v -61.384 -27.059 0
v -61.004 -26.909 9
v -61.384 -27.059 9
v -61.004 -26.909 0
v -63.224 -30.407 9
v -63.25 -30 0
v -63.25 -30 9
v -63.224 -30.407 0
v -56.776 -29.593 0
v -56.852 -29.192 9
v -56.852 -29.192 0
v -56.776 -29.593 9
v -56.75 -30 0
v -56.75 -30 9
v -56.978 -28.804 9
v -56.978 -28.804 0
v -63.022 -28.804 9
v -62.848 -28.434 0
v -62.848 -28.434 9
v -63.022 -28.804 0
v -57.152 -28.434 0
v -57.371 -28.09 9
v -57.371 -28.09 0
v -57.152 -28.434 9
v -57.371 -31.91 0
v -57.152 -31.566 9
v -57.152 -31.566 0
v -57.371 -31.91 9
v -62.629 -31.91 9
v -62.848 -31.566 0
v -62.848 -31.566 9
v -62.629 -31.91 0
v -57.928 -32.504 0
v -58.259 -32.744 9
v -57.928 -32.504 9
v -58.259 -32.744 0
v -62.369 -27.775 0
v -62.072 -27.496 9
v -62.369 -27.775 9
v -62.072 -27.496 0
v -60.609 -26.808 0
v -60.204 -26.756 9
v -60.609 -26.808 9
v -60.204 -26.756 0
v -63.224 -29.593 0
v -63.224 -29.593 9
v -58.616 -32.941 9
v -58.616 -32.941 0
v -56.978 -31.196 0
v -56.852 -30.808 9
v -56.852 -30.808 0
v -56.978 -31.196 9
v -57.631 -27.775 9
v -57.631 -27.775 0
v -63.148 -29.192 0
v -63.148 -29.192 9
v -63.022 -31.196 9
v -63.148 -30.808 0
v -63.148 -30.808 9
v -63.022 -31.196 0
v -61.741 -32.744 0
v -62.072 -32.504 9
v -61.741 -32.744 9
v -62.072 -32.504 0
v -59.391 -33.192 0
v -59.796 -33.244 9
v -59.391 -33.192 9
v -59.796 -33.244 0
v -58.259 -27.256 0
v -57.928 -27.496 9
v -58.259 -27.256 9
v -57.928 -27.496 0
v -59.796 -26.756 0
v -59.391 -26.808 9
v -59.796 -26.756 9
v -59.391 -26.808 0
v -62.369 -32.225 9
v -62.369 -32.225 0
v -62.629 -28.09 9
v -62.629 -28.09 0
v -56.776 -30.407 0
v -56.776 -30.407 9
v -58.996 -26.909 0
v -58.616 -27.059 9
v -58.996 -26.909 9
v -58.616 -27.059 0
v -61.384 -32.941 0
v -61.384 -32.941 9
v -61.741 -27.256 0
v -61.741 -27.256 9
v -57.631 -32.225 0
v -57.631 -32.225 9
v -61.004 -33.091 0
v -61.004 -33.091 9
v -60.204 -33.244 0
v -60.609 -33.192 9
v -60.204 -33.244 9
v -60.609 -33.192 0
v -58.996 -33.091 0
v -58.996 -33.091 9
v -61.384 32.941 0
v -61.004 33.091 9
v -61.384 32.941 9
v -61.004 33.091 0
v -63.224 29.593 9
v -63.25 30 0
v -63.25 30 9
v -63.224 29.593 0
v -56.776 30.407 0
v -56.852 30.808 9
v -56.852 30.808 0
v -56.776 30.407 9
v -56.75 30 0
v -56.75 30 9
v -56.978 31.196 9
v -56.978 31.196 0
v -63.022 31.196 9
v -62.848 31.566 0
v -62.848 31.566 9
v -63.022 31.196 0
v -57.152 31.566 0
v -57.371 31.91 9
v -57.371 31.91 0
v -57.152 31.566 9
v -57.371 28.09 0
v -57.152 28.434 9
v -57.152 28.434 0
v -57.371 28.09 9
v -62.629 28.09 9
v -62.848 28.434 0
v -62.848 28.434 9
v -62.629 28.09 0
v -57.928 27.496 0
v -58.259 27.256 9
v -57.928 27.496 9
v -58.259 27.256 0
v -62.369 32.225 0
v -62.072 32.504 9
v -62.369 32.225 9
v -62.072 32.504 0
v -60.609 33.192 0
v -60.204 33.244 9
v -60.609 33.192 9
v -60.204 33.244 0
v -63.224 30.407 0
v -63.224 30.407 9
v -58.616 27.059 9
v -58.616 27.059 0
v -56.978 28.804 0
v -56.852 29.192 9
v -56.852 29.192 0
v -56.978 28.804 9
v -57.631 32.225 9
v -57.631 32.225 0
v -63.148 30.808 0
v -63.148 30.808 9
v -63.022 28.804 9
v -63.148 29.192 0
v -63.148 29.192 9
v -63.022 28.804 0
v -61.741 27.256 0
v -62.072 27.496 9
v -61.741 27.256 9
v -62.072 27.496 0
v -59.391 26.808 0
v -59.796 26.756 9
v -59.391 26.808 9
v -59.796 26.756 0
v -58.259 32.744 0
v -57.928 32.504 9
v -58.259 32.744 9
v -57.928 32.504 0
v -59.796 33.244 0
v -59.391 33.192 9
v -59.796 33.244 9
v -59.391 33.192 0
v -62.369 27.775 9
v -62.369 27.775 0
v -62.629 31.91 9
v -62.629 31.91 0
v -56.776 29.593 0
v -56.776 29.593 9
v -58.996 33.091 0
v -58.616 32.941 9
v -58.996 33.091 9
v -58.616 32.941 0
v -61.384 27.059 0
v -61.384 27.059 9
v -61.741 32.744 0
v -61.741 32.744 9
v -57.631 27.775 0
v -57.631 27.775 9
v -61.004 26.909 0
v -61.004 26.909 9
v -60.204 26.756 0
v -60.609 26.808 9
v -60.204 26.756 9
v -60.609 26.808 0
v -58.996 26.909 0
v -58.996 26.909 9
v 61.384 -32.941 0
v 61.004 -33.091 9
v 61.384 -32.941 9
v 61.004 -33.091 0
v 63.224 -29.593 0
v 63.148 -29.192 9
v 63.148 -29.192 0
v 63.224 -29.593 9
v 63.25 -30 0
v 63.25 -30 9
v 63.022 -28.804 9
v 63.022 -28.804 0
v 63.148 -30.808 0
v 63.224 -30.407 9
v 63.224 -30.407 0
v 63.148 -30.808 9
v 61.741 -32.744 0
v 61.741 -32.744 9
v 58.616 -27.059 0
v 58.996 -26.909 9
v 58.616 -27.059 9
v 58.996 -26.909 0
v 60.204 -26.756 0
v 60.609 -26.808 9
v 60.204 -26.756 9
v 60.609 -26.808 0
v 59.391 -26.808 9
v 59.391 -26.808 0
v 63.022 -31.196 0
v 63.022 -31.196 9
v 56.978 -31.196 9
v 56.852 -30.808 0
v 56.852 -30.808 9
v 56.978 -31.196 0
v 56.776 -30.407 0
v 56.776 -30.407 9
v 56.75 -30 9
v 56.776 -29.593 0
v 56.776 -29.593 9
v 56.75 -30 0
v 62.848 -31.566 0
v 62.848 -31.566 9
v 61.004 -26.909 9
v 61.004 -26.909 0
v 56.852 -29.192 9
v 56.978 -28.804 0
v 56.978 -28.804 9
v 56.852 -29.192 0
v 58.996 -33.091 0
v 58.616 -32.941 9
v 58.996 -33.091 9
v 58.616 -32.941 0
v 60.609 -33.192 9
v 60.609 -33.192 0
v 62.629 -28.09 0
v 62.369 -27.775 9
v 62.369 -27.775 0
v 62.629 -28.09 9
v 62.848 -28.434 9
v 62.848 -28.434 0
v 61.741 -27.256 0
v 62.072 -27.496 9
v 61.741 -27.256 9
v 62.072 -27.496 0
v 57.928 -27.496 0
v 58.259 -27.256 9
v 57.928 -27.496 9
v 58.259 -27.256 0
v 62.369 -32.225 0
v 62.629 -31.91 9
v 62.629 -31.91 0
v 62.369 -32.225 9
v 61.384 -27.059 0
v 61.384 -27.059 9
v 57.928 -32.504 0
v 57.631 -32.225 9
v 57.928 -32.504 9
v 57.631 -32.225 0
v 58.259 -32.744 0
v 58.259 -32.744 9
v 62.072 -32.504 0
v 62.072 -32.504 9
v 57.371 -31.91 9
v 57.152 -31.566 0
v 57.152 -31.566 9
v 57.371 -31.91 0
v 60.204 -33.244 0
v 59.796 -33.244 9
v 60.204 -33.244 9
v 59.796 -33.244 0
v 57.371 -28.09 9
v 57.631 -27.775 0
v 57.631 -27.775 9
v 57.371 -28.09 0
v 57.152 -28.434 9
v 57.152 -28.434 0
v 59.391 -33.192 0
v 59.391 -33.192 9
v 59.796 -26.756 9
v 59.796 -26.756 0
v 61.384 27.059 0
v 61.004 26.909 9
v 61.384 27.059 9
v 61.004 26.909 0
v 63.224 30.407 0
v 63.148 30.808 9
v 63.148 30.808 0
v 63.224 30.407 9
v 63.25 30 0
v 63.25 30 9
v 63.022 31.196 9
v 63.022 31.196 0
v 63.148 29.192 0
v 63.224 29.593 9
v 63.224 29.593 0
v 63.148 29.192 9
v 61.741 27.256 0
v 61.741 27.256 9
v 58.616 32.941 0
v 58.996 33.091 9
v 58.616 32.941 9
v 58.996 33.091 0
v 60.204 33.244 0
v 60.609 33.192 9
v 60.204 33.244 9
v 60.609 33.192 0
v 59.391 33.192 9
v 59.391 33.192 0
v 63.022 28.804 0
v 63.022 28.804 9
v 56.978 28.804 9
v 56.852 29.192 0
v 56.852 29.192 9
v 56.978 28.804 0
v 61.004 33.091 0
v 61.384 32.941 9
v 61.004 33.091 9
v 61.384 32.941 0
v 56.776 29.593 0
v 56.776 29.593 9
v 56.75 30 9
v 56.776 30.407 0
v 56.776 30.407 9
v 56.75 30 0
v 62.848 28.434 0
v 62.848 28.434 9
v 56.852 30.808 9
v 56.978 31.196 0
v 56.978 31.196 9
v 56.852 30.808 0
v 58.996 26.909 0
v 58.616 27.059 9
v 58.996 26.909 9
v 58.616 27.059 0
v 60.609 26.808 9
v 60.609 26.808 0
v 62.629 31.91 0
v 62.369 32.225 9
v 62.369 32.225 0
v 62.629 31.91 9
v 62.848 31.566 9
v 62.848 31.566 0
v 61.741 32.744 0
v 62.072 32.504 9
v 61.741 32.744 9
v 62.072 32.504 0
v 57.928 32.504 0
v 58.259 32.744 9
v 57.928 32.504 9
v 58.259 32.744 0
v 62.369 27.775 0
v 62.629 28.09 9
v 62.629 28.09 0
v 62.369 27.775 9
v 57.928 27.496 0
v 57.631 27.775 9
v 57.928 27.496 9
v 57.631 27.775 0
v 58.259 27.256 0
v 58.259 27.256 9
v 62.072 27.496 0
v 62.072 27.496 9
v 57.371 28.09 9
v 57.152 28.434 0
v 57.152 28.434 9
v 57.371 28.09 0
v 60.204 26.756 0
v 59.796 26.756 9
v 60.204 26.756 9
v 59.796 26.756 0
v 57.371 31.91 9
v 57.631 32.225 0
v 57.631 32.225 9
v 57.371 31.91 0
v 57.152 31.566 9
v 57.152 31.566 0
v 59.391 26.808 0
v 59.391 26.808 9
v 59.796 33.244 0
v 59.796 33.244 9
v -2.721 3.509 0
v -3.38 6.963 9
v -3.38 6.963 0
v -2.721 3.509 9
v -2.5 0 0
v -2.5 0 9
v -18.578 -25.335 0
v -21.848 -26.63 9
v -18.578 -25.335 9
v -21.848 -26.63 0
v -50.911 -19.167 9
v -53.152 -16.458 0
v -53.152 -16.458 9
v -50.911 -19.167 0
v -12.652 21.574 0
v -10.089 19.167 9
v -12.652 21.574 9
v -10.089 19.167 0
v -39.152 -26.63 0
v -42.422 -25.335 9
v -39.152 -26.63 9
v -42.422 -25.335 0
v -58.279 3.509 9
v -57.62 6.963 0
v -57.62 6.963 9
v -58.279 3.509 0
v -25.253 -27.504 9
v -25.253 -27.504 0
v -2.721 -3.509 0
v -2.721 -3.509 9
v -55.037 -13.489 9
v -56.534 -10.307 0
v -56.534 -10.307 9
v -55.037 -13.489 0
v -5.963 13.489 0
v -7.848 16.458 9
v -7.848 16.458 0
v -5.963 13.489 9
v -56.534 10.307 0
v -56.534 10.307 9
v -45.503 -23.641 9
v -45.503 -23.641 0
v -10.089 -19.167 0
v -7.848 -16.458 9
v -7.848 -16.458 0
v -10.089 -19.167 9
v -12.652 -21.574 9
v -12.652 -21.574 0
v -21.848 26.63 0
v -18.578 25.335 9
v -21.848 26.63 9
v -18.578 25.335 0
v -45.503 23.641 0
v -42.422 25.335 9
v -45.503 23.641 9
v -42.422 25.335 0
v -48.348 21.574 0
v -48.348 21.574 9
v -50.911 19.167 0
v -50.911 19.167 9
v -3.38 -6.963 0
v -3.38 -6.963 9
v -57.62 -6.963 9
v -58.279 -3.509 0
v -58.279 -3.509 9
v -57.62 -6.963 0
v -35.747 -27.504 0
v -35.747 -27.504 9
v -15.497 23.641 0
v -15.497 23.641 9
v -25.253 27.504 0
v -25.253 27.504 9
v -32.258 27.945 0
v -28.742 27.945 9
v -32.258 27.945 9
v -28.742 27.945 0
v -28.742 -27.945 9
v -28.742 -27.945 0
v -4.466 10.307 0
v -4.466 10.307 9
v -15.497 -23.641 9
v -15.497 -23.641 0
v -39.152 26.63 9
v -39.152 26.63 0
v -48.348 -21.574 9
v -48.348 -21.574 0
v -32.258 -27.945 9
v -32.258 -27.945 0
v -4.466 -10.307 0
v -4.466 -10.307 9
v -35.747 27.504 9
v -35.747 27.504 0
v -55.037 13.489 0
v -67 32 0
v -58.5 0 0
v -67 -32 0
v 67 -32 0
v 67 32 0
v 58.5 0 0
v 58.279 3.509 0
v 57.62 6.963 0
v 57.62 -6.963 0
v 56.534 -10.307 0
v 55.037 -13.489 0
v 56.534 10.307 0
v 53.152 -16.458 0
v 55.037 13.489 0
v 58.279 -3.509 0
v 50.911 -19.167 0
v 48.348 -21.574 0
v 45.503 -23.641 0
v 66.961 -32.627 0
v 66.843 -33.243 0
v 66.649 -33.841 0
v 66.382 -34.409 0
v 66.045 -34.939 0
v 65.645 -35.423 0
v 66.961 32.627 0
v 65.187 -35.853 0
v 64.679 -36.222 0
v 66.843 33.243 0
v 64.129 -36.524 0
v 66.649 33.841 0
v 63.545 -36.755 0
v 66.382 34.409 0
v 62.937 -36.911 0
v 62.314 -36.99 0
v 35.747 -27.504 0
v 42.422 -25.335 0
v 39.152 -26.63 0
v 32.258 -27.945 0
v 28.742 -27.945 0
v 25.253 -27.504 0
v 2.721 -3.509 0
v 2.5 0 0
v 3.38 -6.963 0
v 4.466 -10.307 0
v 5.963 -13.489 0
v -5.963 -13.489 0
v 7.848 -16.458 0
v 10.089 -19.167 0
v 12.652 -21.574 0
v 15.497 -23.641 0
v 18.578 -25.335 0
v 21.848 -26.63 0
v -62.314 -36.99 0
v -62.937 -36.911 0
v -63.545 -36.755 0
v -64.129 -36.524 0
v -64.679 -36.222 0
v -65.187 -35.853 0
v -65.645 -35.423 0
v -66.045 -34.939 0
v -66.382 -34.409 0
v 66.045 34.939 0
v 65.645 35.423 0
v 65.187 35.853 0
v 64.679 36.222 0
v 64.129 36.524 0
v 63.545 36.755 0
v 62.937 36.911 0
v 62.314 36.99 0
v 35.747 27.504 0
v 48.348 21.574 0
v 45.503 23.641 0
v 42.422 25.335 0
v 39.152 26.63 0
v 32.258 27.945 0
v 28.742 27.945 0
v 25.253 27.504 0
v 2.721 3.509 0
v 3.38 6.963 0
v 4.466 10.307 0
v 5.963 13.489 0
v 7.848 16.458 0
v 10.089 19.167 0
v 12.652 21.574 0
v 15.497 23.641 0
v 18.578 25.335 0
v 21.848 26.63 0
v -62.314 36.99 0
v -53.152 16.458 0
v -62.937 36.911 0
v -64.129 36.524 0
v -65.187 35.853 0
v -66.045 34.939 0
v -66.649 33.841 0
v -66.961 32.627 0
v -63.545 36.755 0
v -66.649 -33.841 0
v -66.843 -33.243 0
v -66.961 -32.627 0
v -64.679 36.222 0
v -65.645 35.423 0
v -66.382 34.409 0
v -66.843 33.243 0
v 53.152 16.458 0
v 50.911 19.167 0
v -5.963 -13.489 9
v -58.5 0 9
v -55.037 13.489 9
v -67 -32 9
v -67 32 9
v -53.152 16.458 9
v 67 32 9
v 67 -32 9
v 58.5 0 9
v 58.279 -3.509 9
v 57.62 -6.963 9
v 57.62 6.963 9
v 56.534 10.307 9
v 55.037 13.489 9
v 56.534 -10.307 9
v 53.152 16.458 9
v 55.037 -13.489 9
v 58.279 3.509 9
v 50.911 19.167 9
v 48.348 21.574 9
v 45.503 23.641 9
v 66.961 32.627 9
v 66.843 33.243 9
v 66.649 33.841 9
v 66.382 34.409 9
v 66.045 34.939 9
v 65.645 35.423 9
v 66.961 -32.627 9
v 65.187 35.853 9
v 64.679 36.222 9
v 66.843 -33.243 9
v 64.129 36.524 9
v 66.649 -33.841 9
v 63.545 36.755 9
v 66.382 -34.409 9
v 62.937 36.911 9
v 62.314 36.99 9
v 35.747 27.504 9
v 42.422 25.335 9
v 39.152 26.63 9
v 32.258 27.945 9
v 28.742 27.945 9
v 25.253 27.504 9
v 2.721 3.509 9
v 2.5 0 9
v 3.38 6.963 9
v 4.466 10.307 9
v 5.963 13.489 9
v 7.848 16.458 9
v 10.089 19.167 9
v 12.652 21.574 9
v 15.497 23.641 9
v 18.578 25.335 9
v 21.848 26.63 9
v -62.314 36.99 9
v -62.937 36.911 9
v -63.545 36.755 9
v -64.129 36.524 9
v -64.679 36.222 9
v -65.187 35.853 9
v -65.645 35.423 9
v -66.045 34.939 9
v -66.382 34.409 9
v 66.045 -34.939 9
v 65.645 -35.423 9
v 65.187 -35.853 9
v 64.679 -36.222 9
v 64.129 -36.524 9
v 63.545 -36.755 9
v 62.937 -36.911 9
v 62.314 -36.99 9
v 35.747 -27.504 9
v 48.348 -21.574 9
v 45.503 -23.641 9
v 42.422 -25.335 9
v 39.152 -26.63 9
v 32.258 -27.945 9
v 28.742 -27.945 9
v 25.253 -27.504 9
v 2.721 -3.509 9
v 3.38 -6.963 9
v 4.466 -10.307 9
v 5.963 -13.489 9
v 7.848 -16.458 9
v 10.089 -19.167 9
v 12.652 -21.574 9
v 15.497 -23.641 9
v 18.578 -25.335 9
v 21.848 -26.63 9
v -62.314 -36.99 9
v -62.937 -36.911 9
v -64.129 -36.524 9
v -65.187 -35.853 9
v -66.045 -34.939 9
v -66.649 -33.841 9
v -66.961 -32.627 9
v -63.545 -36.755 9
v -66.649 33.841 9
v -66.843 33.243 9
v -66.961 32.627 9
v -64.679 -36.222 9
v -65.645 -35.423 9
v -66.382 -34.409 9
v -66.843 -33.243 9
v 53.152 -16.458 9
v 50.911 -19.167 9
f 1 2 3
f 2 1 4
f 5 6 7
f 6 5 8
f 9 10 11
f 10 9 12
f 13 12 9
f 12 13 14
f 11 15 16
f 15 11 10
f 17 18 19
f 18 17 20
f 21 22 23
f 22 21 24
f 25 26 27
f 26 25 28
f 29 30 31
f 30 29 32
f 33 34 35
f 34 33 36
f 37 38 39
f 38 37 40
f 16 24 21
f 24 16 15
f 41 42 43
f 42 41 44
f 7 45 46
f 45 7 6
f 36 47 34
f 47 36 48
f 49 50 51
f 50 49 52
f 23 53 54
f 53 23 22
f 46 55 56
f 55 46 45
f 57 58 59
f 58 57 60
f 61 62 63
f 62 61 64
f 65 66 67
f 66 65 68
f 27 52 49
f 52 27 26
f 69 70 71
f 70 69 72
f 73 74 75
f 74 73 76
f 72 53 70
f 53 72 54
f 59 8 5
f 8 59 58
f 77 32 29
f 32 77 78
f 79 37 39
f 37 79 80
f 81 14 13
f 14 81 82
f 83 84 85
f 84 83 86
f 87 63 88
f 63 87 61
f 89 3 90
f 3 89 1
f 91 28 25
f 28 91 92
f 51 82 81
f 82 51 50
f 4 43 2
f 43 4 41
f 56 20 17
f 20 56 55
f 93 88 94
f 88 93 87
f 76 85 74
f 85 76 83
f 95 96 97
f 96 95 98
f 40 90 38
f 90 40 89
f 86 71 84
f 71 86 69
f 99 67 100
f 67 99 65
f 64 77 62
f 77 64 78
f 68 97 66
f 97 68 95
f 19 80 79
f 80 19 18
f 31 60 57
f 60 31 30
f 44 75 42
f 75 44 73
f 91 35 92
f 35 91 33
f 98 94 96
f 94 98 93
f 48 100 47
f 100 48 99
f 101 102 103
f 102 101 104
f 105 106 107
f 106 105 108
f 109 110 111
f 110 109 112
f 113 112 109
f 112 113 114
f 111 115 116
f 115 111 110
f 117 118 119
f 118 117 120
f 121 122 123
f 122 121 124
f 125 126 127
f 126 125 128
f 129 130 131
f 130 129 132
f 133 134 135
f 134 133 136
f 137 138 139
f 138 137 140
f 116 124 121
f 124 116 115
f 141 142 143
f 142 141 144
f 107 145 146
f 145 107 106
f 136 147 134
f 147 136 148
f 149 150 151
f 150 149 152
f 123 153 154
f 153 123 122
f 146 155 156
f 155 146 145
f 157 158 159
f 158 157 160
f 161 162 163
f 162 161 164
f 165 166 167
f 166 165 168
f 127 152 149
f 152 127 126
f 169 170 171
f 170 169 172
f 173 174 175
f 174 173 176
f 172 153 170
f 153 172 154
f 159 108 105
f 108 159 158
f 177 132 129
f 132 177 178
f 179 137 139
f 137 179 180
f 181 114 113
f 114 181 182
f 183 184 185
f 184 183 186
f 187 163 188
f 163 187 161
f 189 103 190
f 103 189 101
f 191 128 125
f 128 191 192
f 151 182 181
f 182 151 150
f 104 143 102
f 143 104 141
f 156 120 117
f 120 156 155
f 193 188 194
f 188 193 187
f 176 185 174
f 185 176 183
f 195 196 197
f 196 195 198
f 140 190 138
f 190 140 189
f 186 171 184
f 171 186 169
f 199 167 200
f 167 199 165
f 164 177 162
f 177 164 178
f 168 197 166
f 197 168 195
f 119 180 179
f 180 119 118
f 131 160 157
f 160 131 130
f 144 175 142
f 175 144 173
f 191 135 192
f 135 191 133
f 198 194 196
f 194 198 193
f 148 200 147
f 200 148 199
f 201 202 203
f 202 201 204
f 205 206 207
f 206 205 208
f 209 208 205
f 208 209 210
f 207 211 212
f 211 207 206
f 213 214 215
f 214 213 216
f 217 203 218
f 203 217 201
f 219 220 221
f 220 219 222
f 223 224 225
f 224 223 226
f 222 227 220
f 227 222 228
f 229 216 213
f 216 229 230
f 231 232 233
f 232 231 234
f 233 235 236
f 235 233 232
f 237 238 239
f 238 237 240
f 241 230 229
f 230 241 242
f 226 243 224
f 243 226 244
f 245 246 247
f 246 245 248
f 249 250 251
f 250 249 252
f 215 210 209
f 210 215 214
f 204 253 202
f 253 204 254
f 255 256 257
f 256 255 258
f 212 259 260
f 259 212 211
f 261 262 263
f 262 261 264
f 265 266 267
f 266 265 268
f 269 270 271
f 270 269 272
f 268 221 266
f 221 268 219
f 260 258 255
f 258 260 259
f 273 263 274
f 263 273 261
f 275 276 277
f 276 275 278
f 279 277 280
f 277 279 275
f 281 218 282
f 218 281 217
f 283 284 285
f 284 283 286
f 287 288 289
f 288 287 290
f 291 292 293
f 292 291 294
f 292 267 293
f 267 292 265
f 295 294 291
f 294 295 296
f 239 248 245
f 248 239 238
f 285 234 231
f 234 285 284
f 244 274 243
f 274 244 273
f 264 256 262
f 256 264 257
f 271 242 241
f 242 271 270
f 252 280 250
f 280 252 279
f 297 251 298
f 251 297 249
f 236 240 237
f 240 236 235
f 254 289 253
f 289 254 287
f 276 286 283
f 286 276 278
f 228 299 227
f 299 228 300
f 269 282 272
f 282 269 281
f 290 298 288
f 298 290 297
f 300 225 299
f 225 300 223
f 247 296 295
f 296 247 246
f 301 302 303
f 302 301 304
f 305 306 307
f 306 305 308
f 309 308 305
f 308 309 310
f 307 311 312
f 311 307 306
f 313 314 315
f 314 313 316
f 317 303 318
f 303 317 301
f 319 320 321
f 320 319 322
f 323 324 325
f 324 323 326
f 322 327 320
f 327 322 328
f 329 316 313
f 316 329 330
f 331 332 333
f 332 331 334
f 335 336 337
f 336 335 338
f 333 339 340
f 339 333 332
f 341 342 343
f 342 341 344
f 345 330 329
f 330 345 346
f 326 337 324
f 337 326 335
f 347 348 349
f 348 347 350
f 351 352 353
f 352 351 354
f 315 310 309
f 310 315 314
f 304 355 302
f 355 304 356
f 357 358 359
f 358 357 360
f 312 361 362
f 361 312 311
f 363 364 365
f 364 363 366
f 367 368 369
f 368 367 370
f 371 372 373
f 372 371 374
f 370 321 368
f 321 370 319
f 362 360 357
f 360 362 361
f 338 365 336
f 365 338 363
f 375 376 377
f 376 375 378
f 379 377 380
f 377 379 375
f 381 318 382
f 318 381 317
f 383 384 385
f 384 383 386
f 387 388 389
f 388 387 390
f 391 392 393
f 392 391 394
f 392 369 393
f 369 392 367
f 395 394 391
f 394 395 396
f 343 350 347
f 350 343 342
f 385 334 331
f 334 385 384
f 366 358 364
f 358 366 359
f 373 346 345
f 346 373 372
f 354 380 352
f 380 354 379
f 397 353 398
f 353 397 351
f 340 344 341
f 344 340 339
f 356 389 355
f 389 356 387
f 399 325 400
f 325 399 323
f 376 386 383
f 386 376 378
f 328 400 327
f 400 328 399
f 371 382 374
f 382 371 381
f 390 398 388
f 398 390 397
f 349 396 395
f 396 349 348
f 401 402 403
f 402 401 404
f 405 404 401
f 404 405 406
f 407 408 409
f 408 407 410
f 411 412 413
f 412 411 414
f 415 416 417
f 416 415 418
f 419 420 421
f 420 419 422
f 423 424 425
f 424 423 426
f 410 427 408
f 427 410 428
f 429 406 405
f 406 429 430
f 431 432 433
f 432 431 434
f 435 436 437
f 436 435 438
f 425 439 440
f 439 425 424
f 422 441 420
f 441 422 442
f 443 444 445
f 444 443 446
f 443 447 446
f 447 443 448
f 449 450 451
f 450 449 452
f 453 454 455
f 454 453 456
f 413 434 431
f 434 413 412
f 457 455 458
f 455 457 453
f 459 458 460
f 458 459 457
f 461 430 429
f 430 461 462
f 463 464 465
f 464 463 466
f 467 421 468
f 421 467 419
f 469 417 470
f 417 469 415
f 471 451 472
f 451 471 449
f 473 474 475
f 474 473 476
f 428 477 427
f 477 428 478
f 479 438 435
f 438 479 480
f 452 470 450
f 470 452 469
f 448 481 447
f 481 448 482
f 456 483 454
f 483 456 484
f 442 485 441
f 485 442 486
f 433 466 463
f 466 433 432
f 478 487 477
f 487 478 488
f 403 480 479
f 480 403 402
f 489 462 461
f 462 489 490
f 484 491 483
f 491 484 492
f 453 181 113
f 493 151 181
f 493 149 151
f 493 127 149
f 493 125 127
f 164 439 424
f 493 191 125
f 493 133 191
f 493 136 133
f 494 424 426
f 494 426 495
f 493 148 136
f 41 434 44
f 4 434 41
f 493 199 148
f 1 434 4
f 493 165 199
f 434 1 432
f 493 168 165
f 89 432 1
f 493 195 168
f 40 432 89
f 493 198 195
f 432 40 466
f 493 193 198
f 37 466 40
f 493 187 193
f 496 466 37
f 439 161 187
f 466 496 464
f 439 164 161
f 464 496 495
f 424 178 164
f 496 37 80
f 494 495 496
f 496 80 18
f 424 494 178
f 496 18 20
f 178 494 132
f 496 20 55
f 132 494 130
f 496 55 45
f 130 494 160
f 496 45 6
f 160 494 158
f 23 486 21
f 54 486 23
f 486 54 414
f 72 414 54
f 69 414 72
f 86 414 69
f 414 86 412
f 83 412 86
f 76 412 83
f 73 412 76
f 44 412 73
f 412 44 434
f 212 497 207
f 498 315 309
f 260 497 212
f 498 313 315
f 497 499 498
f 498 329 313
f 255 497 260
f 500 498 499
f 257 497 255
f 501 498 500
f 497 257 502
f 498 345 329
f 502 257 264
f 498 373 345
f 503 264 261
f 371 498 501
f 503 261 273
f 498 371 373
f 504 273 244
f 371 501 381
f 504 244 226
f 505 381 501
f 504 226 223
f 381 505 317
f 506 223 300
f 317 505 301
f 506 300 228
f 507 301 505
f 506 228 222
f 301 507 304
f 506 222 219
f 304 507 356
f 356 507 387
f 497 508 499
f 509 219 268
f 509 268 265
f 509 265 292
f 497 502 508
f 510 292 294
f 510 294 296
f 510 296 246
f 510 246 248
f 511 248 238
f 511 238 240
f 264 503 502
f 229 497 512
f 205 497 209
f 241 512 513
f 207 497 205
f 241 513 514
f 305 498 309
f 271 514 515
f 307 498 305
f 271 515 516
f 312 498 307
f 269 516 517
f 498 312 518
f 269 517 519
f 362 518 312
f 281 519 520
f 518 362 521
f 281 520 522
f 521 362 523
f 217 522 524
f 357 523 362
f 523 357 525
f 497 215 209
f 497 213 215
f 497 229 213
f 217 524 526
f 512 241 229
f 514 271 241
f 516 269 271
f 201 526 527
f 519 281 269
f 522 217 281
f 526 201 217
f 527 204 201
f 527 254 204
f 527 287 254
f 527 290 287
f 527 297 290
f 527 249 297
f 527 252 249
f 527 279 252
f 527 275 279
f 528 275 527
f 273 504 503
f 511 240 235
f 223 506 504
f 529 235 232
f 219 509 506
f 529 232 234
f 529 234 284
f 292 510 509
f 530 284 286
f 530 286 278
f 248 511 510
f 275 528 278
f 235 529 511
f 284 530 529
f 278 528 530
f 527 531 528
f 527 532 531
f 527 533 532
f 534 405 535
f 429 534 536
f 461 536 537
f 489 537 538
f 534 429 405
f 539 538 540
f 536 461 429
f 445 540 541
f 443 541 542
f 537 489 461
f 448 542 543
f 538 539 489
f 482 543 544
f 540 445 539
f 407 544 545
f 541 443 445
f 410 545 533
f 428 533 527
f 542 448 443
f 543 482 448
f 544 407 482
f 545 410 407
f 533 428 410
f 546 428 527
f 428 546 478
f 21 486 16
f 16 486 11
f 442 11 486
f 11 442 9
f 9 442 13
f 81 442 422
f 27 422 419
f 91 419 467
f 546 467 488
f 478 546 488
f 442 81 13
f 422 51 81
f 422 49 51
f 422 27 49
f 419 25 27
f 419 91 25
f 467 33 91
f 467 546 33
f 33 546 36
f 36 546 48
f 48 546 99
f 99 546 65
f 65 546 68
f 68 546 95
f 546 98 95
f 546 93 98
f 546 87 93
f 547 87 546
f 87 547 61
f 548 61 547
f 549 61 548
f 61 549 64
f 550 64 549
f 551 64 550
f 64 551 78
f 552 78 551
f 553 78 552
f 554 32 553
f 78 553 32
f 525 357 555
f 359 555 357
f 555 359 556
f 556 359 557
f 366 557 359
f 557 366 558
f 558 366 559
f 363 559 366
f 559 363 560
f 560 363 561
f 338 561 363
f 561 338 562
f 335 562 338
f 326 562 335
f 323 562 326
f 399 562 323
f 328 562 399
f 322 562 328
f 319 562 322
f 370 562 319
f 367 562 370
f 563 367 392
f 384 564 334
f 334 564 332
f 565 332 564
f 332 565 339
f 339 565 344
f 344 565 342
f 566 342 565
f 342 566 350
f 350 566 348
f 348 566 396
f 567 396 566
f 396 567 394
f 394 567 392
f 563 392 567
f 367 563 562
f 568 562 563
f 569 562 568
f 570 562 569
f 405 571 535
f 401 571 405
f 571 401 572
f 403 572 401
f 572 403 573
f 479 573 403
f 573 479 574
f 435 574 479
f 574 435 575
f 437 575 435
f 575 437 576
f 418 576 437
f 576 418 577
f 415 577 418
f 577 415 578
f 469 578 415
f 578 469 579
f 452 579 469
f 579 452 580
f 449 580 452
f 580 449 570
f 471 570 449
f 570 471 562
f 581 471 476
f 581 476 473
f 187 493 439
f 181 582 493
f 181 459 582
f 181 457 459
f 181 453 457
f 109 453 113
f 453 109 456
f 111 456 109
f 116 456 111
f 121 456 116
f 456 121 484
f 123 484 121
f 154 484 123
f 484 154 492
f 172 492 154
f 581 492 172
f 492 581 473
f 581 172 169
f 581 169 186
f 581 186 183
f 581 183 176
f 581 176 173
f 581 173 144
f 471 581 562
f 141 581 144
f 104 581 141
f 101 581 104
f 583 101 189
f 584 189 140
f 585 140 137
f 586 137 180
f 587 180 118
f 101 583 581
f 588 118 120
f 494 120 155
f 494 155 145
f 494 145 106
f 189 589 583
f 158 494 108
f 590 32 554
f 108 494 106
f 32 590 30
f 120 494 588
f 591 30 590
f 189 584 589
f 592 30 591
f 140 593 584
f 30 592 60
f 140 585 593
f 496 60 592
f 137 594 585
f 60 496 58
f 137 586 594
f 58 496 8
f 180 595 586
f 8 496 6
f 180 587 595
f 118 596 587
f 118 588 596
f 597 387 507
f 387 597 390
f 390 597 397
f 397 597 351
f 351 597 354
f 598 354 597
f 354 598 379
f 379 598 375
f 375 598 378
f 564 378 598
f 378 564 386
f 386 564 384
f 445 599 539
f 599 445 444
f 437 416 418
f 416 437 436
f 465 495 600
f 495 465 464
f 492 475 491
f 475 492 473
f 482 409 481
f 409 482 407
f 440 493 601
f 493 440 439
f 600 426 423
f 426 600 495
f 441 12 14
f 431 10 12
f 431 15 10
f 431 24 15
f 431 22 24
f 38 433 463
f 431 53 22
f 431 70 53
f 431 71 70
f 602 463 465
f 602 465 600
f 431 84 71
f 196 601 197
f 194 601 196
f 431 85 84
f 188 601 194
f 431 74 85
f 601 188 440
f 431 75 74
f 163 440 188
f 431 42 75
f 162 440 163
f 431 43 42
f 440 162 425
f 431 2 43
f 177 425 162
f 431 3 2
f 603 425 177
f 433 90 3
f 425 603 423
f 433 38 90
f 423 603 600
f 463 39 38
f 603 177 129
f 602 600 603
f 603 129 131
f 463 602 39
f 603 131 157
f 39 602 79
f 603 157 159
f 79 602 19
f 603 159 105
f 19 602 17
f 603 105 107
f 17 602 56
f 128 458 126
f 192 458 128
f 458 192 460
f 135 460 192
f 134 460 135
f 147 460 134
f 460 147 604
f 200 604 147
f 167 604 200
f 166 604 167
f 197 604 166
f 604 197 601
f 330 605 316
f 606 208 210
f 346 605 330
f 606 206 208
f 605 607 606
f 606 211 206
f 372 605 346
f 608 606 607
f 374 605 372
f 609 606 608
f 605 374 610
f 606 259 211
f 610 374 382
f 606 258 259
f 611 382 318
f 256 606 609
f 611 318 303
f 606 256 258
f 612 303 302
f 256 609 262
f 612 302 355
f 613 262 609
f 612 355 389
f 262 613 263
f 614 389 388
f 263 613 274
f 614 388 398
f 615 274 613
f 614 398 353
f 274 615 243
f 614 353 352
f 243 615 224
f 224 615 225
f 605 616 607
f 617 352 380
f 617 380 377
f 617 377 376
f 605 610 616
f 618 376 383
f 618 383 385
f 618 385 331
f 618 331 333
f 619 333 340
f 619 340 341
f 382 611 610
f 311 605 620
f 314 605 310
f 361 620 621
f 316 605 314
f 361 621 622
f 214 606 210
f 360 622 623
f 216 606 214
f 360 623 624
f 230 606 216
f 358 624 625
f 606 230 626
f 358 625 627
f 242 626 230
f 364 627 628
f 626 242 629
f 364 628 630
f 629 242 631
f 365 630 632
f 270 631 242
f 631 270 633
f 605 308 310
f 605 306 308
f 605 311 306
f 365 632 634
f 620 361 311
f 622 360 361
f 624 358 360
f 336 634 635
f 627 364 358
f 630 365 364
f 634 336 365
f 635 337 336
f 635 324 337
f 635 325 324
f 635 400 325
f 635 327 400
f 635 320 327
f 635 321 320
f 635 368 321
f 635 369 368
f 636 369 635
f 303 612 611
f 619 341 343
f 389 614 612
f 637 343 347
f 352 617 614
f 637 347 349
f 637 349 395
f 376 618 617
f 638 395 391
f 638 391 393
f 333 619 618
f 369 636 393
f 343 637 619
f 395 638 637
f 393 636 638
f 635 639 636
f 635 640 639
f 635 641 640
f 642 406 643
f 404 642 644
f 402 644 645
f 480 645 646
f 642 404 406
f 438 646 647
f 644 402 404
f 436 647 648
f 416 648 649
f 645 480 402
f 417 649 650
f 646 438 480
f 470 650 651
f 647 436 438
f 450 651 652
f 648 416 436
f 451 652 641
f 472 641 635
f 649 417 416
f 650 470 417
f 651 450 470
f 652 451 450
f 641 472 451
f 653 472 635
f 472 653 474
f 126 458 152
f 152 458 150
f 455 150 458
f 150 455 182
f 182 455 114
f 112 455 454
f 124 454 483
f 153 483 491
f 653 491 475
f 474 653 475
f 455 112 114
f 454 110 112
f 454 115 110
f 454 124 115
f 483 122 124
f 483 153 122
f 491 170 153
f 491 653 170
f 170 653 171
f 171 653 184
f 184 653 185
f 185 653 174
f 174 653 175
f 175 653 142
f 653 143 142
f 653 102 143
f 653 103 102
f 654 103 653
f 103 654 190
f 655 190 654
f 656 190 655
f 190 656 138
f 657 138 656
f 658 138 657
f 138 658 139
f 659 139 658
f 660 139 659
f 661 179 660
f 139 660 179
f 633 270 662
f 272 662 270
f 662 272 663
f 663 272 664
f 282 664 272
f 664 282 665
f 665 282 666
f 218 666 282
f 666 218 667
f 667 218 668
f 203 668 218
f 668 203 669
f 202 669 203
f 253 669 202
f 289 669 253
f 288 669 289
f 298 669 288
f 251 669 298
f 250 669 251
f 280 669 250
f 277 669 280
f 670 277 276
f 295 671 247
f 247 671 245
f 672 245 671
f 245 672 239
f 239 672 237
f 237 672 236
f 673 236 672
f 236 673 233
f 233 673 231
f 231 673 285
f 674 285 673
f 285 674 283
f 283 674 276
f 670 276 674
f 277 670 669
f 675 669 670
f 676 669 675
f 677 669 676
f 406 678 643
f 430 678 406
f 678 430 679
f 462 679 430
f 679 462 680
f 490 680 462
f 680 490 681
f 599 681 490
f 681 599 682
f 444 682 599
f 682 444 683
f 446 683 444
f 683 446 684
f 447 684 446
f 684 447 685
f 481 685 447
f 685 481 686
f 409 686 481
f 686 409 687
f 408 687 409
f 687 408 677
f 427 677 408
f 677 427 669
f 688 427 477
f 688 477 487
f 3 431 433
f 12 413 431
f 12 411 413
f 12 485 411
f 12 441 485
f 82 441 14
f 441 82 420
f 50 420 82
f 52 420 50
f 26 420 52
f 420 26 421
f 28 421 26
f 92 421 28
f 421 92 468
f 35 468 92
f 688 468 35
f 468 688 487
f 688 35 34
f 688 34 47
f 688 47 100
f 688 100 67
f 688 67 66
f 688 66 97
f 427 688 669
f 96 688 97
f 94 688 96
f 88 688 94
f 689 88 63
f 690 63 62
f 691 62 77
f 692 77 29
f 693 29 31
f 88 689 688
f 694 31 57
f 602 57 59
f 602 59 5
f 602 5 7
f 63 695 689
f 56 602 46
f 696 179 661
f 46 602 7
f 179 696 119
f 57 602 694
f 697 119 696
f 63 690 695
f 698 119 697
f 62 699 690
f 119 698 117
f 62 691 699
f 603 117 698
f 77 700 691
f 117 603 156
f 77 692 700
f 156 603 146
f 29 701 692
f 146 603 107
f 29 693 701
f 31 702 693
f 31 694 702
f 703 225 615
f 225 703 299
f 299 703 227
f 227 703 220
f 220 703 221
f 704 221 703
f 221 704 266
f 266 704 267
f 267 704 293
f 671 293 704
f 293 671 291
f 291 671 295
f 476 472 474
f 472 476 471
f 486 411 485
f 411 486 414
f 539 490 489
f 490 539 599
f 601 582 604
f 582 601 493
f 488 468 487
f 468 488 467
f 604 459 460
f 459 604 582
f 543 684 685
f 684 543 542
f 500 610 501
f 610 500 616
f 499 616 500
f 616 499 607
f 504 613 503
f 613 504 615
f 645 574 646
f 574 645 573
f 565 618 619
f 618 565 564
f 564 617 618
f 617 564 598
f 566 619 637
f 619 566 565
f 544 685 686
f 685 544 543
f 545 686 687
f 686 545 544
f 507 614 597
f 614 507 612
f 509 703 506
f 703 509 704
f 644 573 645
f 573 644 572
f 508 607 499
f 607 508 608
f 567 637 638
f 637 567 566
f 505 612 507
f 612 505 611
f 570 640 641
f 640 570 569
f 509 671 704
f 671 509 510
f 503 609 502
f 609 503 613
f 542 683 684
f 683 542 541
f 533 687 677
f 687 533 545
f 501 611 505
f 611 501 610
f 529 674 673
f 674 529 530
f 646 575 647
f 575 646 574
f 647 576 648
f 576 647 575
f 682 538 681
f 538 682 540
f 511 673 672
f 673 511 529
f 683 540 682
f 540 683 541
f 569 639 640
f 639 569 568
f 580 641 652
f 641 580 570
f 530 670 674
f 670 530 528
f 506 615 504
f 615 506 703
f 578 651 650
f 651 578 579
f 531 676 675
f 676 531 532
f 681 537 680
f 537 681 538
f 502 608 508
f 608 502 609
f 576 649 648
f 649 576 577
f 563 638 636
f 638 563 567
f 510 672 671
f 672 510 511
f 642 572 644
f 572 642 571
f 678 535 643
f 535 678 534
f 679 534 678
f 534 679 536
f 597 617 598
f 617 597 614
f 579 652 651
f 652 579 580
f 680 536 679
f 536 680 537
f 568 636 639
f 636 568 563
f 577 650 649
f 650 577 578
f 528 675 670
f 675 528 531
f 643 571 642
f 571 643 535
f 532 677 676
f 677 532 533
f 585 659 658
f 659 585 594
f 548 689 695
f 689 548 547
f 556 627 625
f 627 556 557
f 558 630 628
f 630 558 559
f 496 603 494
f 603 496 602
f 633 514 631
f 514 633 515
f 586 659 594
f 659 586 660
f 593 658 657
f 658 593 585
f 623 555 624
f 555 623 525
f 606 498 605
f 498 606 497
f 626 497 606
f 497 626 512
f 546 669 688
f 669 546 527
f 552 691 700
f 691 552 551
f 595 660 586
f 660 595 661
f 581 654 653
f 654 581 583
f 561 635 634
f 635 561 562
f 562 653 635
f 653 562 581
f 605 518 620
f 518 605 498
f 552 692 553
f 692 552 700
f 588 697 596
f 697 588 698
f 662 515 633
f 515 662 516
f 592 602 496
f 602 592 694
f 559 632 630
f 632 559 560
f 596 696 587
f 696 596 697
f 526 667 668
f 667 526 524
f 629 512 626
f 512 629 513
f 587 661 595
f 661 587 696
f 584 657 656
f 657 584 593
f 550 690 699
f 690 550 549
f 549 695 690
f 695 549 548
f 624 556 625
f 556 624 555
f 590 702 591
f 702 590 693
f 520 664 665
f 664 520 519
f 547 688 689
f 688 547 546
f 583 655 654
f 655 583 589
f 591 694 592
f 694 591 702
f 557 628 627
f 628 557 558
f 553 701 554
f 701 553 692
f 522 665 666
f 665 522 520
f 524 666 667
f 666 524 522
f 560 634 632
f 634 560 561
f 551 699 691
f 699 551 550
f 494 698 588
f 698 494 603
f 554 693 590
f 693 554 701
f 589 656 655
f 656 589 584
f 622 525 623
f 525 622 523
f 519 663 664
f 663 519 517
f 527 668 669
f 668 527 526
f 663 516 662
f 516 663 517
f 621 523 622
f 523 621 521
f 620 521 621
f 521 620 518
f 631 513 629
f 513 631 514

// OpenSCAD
$fn = 50;

difference() {
	union() {
		hull() {
			translate(v = [-62.0, 32.0, 0]) {
				cylinder(h = 9, r = 5);
			}
			translate(v = [62.0, 32.0, 0]) {
				cylinder(h = 9, r = 5);
			}
			translate(v = [-62.0, -32.0, 0]) {
				cylinder(h = 9, r = 5);
			}
			translate(v = [62.0, -32.0, 0]) {
				cylinder(h = 9, r = 5);
			}
		}
	}
	union() {
		translate(v = [-60.0, -30.0, -100.0]) {
			cylinder(h = 200, r = 3.25);
		}
		translate(v = [-60.0, 30.0, -100.0]) {
			cylinder(h = 200, r = 3.25);
		}
		translate(v = [60.0, -30.0, -100.0]) {
			cylinder(h = 200, r = 3.25);
		}
		translate(v = [60.0, 30.0, -100.0]) {
			cylinder(h = 200, r = 3.25);
		}
		translate(v = [-60.0, -30.0, -100.0]) {
			cylinder(h = 200, r = 1.8);
		}
		translate(v = [-60.0, 30.0, -100.0]) {
			cylinder(h = 200, r = 1.8);
		}
		translate(v = [60.0, -30.0, -100.0]) {
			cylinder(h = 200, r = 1.8);
		}
		translate(v = [60.0, 30.0, -100.0]) {
			cylinder(h = 200, r = 1.8);
		}
		translate(v = [-30.5, 0, 0.0]) {
			cylinder(h = 9, r = 28.0);
		}
		translate(v = [30.5, 0, 0.0]) {
			cylinder(h = 9, r = 28.0);
		}
	}
}
